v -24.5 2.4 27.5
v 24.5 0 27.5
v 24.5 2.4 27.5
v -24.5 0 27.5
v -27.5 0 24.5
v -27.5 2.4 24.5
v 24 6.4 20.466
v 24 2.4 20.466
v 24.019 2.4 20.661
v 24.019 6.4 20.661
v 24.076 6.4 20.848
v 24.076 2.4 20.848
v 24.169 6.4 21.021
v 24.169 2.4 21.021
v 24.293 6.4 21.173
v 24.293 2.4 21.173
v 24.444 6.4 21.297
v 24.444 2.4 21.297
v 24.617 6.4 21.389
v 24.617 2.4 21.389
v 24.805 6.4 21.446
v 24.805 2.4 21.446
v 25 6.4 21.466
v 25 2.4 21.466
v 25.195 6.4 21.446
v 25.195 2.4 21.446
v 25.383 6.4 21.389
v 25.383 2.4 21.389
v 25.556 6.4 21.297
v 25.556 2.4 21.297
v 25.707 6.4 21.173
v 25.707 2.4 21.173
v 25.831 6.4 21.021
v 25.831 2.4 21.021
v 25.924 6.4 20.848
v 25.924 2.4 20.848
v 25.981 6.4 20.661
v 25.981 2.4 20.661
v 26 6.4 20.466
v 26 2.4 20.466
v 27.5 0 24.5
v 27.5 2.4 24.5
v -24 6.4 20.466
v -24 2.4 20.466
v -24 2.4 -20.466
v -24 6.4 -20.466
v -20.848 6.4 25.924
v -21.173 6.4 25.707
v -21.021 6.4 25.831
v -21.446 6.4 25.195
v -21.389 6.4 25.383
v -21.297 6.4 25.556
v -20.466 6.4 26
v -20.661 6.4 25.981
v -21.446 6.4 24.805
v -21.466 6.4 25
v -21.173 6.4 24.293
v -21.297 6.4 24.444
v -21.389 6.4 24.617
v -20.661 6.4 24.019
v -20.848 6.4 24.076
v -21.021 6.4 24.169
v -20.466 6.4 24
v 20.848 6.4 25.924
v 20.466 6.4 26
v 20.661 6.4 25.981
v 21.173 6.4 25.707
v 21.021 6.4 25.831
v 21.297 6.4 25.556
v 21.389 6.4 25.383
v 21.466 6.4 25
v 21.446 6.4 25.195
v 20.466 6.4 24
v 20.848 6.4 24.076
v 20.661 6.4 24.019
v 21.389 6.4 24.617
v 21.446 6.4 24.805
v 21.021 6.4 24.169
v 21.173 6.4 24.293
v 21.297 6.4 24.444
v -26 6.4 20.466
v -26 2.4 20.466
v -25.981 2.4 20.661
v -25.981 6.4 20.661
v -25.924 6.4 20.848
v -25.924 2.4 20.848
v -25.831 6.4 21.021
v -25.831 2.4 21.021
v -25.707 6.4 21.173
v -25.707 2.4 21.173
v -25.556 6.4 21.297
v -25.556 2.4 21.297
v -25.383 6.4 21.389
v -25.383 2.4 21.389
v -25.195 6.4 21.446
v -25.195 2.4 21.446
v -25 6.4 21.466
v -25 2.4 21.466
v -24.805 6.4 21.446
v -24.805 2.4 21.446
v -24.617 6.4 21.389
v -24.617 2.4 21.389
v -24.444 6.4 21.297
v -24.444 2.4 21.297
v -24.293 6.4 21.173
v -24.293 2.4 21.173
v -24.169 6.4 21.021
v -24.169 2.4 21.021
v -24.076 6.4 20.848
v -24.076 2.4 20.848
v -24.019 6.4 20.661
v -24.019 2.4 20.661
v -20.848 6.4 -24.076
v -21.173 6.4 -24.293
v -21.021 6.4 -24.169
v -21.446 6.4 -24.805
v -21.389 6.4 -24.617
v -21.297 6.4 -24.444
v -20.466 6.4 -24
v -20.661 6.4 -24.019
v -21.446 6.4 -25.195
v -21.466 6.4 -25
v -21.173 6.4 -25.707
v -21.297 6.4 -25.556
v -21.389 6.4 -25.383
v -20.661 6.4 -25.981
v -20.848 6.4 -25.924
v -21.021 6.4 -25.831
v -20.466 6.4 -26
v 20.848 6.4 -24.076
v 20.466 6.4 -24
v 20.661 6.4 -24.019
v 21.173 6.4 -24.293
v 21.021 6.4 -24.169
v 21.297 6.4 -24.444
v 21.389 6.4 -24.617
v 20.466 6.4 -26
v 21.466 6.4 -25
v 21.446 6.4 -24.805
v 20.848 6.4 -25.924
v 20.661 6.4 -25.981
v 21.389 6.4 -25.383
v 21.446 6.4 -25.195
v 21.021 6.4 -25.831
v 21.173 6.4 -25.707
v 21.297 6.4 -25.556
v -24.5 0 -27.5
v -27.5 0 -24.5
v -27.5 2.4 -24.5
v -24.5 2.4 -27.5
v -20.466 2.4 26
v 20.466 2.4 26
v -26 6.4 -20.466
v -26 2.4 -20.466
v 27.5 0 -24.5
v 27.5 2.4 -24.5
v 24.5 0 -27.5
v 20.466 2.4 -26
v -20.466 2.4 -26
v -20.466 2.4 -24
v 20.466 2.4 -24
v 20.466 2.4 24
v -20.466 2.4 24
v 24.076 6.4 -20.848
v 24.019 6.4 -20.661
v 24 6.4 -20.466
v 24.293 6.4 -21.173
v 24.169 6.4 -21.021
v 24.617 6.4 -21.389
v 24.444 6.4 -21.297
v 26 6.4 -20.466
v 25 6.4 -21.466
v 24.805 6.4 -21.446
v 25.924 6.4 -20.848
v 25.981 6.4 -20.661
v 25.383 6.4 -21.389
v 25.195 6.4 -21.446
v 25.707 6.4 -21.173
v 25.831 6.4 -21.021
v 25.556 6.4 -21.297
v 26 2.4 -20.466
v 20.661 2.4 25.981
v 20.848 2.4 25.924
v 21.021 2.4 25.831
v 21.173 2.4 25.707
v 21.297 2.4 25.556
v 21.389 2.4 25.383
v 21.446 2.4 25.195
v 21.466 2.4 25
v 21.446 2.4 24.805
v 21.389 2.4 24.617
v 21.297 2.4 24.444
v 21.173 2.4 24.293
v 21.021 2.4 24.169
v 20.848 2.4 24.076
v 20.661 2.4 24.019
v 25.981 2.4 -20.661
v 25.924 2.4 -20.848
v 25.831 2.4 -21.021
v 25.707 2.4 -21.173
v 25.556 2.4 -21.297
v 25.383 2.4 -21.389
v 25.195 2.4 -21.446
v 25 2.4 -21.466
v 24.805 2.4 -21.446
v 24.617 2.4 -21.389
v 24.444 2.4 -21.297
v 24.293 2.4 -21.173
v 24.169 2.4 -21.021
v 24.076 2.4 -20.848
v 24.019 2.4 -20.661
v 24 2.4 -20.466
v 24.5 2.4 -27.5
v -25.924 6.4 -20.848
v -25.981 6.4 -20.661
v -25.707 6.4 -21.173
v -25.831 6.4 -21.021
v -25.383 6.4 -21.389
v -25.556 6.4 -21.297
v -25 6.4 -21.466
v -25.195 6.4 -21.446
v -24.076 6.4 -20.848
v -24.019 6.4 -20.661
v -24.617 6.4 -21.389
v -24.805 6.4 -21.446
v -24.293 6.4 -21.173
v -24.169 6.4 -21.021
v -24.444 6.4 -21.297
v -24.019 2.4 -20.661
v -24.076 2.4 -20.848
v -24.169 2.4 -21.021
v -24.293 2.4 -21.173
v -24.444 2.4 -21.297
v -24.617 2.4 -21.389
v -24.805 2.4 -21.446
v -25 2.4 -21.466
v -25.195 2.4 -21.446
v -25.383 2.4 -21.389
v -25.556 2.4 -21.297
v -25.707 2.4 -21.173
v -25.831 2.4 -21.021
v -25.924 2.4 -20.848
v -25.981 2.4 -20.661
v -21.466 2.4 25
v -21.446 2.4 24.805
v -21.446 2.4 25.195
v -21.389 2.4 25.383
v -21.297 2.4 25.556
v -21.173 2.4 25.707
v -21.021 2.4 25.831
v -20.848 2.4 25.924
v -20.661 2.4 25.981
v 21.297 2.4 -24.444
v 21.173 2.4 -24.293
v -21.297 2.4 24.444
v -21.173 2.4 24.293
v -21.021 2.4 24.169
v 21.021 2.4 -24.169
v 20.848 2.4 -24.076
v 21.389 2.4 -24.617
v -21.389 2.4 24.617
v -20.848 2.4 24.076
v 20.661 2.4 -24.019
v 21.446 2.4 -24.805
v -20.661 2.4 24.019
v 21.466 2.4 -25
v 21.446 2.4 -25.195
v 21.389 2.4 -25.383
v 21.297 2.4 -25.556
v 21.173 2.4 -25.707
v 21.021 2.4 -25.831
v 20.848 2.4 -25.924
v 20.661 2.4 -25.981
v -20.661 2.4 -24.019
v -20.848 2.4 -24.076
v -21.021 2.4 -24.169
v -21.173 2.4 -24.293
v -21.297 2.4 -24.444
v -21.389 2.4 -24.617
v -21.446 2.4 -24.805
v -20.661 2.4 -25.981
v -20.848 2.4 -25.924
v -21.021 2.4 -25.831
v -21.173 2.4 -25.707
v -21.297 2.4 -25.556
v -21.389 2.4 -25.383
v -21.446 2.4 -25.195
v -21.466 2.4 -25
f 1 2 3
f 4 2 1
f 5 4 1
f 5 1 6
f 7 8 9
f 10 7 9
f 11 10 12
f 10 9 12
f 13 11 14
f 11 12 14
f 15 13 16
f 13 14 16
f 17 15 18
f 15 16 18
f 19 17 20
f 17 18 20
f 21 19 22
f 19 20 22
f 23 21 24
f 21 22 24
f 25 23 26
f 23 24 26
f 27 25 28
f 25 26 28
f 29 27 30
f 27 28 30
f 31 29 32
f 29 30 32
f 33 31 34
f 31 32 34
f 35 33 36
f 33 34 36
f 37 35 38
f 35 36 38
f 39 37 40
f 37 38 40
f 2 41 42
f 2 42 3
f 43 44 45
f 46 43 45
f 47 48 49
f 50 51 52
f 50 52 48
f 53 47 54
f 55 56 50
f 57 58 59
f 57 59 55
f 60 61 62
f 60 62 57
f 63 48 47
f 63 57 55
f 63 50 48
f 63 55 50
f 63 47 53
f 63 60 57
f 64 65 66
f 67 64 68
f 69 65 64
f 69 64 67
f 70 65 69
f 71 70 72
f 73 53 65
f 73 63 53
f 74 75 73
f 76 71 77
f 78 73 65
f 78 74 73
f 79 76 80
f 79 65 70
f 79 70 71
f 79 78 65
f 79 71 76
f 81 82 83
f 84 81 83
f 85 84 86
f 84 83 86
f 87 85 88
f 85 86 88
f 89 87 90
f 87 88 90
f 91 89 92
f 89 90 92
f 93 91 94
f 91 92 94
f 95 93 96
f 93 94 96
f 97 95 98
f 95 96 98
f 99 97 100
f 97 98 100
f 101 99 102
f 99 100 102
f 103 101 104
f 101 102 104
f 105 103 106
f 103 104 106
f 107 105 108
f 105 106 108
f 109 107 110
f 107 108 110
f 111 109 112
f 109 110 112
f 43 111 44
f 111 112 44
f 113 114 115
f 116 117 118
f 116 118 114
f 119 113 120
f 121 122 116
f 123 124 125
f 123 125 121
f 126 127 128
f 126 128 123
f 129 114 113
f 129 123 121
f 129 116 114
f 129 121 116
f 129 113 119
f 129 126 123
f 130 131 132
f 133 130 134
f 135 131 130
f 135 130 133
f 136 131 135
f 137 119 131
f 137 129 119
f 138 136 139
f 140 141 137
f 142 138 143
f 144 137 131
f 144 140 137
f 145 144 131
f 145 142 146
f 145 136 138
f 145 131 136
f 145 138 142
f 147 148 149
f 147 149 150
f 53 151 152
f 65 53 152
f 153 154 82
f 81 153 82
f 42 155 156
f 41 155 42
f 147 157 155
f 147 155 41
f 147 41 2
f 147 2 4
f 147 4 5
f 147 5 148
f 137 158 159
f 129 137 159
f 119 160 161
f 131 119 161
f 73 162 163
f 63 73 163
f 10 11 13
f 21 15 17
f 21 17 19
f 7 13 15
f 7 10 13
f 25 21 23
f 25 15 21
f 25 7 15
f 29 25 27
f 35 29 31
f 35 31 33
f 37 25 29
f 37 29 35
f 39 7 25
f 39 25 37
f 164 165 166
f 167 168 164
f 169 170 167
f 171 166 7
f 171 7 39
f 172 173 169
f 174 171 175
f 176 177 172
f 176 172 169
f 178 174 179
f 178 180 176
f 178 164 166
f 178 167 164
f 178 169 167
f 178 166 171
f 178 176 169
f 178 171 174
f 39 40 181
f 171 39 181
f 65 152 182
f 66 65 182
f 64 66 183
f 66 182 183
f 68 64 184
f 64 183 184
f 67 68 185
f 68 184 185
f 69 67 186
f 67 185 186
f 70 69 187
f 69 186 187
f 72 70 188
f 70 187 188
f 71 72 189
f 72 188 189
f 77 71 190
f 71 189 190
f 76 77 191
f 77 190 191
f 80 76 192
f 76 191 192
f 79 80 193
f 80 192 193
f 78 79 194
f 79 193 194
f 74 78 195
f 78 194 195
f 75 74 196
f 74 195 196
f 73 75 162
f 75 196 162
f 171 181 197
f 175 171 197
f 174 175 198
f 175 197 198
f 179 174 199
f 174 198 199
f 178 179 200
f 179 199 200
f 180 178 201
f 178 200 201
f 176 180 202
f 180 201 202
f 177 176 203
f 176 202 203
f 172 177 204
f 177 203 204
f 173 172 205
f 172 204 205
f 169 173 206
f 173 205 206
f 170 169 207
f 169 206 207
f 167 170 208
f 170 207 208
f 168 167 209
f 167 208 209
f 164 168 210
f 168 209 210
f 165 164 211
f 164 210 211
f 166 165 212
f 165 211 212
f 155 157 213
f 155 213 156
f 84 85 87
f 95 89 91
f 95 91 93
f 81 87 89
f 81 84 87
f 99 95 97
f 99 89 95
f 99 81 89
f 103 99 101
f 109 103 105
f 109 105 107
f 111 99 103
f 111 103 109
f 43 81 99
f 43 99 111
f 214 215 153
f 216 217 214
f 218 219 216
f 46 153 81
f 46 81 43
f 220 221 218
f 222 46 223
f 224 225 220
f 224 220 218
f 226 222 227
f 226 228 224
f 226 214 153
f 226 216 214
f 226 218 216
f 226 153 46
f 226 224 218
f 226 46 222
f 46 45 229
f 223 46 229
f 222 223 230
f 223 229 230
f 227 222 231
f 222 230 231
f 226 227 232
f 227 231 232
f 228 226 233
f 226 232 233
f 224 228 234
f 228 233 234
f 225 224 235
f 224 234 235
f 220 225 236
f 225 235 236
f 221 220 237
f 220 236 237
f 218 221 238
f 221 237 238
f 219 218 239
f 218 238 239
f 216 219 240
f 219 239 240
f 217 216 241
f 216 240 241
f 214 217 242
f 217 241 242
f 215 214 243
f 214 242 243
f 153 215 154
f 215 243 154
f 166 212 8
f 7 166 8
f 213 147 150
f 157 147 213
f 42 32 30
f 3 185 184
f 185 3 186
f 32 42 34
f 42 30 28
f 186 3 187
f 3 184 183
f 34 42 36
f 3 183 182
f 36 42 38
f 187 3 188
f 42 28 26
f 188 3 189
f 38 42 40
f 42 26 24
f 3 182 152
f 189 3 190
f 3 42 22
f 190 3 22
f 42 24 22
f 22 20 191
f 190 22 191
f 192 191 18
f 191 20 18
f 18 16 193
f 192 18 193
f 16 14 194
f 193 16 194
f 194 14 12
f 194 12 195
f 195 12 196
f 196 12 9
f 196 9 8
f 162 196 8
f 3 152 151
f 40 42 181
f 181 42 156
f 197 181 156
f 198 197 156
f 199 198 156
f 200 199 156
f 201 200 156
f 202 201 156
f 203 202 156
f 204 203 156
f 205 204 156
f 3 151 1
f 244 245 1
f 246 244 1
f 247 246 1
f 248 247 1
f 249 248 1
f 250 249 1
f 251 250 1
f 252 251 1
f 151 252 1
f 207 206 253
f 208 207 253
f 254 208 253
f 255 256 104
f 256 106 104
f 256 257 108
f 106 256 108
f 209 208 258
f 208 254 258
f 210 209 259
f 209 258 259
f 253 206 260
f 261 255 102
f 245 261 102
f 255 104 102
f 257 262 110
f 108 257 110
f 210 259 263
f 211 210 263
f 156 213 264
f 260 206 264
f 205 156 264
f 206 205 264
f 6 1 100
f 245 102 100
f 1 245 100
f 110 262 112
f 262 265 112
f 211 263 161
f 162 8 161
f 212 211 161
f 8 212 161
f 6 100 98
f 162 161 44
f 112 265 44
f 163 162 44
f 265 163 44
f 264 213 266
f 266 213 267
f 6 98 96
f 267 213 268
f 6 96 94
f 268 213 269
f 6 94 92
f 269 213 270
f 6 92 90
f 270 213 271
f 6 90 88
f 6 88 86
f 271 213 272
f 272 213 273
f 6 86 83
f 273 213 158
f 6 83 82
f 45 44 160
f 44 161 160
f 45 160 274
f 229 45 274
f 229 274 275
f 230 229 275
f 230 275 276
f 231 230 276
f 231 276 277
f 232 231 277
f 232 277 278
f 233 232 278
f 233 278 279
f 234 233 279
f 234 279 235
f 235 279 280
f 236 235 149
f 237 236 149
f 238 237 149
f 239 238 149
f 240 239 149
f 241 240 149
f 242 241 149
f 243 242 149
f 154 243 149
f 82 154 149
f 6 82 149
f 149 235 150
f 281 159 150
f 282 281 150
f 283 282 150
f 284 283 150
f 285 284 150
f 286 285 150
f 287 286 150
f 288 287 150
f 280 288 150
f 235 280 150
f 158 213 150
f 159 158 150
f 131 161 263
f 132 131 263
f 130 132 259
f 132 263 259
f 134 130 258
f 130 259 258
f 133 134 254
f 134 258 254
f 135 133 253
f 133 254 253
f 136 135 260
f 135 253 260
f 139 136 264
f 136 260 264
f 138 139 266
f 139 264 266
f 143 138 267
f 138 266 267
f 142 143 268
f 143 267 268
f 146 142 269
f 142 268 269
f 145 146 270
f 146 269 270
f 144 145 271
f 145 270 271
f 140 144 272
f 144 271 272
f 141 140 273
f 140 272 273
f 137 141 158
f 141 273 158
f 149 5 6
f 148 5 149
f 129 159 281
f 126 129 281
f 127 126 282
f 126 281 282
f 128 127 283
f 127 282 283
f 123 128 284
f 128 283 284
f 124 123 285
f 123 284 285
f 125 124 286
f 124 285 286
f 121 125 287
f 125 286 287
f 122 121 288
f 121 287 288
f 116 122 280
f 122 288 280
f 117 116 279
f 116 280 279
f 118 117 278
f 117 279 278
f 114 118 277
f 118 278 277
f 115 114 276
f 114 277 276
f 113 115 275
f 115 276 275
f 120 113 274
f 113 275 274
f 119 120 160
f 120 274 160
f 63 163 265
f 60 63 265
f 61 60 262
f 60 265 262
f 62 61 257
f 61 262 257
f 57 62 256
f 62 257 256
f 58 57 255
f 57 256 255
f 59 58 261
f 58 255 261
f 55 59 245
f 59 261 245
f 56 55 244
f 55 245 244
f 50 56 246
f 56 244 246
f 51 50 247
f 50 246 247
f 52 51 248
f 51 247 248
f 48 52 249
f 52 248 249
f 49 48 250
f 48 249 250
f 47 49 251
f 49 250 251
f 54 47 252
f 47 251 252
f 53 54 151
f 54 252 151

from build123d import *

# Parameters (mm, degrees)
BOSS_EXTRUDE1_DEPTH = 2.4
BOSS_EXTRUDE2_DEPTH = 4


with BuildPart() as part:
    # Sketch1 → Boss-Extrude1 (new body)
    with BuildSketch(Plane(origin=(0, 0, 0), x_dir=(1, 0, 0), z_dir=(0, 1, 0))):
        Polygon((-27.5, 24.5), (-24.5, 27.5), (24.5, 27.5), (27.5, 24.5), (27.5, -24.5), (24.5, -27.5), (-24.5, -27.5), (-27.5, -24.5), align=None)
    extrude(amount=BOSS_EXTRUDE1_DEPTH)

    # Sketch2 → Boss-Extrude2 (add)
    with BuildSketch(Plane(origin=(0, 2.4, 0), x_dir=(1, 0, 0), z_dir=(0, 1, 0))):
        with BuildLine():
            Line((-24, -20.465570271), (-24, 20.465570271))
            ThreePointArc((-24, 20.465570271), (-25, 21.465570271), (-26, 20.465570271))
            Line((-26, 20.465570271), (-26, -20.465570271))
            ThreePointArc((-26, -20.465570271), (-25, -21.465570271), (-24, -20.465570271))
        make_face()
        with BuildLine():
            Line((-20.465570271, 24), (20.465570271, 24))
            ThreePointArc((20.465570271, 24), (21.465570271, 25), (20.465570271, 26))
            Line((20.465570271, 26), (-20.465570271, 26))
            ThreePointArc((-20.465570271, 26), (-21.465570271, 25), (-20.465570271, 24))
        make_face()
        with BuildLine():
            Line((24, 20.465570271), (24, -20.465570271))
            ThreePointArc((24, -20.465570271), (25, -21.465570271), (26, -20.465570271))
            Line((26, -20.465570271), (26, 20.465570271))
            ThreePointArc((26, 20.465570271), (25, 21.465570271), (24, 20.465570271))
        make_face()
        with BuildLine():
            Line((20.465570271, -24), (-20.465570271, -24))
            ThreePointArc((-20.465570271, -24), (-21.465570271, -25), (-20.465570271, -26))
            Line((-20.465570271, -26), (20.465570271, -26))
            ThreePointArc((20.465570271, -26), (21.465570271, -25), (20.465570271, -24))
        make_face()
    extrude(amount=BOSS_EXTRUDE2_DEPTH)


solid = part.part
